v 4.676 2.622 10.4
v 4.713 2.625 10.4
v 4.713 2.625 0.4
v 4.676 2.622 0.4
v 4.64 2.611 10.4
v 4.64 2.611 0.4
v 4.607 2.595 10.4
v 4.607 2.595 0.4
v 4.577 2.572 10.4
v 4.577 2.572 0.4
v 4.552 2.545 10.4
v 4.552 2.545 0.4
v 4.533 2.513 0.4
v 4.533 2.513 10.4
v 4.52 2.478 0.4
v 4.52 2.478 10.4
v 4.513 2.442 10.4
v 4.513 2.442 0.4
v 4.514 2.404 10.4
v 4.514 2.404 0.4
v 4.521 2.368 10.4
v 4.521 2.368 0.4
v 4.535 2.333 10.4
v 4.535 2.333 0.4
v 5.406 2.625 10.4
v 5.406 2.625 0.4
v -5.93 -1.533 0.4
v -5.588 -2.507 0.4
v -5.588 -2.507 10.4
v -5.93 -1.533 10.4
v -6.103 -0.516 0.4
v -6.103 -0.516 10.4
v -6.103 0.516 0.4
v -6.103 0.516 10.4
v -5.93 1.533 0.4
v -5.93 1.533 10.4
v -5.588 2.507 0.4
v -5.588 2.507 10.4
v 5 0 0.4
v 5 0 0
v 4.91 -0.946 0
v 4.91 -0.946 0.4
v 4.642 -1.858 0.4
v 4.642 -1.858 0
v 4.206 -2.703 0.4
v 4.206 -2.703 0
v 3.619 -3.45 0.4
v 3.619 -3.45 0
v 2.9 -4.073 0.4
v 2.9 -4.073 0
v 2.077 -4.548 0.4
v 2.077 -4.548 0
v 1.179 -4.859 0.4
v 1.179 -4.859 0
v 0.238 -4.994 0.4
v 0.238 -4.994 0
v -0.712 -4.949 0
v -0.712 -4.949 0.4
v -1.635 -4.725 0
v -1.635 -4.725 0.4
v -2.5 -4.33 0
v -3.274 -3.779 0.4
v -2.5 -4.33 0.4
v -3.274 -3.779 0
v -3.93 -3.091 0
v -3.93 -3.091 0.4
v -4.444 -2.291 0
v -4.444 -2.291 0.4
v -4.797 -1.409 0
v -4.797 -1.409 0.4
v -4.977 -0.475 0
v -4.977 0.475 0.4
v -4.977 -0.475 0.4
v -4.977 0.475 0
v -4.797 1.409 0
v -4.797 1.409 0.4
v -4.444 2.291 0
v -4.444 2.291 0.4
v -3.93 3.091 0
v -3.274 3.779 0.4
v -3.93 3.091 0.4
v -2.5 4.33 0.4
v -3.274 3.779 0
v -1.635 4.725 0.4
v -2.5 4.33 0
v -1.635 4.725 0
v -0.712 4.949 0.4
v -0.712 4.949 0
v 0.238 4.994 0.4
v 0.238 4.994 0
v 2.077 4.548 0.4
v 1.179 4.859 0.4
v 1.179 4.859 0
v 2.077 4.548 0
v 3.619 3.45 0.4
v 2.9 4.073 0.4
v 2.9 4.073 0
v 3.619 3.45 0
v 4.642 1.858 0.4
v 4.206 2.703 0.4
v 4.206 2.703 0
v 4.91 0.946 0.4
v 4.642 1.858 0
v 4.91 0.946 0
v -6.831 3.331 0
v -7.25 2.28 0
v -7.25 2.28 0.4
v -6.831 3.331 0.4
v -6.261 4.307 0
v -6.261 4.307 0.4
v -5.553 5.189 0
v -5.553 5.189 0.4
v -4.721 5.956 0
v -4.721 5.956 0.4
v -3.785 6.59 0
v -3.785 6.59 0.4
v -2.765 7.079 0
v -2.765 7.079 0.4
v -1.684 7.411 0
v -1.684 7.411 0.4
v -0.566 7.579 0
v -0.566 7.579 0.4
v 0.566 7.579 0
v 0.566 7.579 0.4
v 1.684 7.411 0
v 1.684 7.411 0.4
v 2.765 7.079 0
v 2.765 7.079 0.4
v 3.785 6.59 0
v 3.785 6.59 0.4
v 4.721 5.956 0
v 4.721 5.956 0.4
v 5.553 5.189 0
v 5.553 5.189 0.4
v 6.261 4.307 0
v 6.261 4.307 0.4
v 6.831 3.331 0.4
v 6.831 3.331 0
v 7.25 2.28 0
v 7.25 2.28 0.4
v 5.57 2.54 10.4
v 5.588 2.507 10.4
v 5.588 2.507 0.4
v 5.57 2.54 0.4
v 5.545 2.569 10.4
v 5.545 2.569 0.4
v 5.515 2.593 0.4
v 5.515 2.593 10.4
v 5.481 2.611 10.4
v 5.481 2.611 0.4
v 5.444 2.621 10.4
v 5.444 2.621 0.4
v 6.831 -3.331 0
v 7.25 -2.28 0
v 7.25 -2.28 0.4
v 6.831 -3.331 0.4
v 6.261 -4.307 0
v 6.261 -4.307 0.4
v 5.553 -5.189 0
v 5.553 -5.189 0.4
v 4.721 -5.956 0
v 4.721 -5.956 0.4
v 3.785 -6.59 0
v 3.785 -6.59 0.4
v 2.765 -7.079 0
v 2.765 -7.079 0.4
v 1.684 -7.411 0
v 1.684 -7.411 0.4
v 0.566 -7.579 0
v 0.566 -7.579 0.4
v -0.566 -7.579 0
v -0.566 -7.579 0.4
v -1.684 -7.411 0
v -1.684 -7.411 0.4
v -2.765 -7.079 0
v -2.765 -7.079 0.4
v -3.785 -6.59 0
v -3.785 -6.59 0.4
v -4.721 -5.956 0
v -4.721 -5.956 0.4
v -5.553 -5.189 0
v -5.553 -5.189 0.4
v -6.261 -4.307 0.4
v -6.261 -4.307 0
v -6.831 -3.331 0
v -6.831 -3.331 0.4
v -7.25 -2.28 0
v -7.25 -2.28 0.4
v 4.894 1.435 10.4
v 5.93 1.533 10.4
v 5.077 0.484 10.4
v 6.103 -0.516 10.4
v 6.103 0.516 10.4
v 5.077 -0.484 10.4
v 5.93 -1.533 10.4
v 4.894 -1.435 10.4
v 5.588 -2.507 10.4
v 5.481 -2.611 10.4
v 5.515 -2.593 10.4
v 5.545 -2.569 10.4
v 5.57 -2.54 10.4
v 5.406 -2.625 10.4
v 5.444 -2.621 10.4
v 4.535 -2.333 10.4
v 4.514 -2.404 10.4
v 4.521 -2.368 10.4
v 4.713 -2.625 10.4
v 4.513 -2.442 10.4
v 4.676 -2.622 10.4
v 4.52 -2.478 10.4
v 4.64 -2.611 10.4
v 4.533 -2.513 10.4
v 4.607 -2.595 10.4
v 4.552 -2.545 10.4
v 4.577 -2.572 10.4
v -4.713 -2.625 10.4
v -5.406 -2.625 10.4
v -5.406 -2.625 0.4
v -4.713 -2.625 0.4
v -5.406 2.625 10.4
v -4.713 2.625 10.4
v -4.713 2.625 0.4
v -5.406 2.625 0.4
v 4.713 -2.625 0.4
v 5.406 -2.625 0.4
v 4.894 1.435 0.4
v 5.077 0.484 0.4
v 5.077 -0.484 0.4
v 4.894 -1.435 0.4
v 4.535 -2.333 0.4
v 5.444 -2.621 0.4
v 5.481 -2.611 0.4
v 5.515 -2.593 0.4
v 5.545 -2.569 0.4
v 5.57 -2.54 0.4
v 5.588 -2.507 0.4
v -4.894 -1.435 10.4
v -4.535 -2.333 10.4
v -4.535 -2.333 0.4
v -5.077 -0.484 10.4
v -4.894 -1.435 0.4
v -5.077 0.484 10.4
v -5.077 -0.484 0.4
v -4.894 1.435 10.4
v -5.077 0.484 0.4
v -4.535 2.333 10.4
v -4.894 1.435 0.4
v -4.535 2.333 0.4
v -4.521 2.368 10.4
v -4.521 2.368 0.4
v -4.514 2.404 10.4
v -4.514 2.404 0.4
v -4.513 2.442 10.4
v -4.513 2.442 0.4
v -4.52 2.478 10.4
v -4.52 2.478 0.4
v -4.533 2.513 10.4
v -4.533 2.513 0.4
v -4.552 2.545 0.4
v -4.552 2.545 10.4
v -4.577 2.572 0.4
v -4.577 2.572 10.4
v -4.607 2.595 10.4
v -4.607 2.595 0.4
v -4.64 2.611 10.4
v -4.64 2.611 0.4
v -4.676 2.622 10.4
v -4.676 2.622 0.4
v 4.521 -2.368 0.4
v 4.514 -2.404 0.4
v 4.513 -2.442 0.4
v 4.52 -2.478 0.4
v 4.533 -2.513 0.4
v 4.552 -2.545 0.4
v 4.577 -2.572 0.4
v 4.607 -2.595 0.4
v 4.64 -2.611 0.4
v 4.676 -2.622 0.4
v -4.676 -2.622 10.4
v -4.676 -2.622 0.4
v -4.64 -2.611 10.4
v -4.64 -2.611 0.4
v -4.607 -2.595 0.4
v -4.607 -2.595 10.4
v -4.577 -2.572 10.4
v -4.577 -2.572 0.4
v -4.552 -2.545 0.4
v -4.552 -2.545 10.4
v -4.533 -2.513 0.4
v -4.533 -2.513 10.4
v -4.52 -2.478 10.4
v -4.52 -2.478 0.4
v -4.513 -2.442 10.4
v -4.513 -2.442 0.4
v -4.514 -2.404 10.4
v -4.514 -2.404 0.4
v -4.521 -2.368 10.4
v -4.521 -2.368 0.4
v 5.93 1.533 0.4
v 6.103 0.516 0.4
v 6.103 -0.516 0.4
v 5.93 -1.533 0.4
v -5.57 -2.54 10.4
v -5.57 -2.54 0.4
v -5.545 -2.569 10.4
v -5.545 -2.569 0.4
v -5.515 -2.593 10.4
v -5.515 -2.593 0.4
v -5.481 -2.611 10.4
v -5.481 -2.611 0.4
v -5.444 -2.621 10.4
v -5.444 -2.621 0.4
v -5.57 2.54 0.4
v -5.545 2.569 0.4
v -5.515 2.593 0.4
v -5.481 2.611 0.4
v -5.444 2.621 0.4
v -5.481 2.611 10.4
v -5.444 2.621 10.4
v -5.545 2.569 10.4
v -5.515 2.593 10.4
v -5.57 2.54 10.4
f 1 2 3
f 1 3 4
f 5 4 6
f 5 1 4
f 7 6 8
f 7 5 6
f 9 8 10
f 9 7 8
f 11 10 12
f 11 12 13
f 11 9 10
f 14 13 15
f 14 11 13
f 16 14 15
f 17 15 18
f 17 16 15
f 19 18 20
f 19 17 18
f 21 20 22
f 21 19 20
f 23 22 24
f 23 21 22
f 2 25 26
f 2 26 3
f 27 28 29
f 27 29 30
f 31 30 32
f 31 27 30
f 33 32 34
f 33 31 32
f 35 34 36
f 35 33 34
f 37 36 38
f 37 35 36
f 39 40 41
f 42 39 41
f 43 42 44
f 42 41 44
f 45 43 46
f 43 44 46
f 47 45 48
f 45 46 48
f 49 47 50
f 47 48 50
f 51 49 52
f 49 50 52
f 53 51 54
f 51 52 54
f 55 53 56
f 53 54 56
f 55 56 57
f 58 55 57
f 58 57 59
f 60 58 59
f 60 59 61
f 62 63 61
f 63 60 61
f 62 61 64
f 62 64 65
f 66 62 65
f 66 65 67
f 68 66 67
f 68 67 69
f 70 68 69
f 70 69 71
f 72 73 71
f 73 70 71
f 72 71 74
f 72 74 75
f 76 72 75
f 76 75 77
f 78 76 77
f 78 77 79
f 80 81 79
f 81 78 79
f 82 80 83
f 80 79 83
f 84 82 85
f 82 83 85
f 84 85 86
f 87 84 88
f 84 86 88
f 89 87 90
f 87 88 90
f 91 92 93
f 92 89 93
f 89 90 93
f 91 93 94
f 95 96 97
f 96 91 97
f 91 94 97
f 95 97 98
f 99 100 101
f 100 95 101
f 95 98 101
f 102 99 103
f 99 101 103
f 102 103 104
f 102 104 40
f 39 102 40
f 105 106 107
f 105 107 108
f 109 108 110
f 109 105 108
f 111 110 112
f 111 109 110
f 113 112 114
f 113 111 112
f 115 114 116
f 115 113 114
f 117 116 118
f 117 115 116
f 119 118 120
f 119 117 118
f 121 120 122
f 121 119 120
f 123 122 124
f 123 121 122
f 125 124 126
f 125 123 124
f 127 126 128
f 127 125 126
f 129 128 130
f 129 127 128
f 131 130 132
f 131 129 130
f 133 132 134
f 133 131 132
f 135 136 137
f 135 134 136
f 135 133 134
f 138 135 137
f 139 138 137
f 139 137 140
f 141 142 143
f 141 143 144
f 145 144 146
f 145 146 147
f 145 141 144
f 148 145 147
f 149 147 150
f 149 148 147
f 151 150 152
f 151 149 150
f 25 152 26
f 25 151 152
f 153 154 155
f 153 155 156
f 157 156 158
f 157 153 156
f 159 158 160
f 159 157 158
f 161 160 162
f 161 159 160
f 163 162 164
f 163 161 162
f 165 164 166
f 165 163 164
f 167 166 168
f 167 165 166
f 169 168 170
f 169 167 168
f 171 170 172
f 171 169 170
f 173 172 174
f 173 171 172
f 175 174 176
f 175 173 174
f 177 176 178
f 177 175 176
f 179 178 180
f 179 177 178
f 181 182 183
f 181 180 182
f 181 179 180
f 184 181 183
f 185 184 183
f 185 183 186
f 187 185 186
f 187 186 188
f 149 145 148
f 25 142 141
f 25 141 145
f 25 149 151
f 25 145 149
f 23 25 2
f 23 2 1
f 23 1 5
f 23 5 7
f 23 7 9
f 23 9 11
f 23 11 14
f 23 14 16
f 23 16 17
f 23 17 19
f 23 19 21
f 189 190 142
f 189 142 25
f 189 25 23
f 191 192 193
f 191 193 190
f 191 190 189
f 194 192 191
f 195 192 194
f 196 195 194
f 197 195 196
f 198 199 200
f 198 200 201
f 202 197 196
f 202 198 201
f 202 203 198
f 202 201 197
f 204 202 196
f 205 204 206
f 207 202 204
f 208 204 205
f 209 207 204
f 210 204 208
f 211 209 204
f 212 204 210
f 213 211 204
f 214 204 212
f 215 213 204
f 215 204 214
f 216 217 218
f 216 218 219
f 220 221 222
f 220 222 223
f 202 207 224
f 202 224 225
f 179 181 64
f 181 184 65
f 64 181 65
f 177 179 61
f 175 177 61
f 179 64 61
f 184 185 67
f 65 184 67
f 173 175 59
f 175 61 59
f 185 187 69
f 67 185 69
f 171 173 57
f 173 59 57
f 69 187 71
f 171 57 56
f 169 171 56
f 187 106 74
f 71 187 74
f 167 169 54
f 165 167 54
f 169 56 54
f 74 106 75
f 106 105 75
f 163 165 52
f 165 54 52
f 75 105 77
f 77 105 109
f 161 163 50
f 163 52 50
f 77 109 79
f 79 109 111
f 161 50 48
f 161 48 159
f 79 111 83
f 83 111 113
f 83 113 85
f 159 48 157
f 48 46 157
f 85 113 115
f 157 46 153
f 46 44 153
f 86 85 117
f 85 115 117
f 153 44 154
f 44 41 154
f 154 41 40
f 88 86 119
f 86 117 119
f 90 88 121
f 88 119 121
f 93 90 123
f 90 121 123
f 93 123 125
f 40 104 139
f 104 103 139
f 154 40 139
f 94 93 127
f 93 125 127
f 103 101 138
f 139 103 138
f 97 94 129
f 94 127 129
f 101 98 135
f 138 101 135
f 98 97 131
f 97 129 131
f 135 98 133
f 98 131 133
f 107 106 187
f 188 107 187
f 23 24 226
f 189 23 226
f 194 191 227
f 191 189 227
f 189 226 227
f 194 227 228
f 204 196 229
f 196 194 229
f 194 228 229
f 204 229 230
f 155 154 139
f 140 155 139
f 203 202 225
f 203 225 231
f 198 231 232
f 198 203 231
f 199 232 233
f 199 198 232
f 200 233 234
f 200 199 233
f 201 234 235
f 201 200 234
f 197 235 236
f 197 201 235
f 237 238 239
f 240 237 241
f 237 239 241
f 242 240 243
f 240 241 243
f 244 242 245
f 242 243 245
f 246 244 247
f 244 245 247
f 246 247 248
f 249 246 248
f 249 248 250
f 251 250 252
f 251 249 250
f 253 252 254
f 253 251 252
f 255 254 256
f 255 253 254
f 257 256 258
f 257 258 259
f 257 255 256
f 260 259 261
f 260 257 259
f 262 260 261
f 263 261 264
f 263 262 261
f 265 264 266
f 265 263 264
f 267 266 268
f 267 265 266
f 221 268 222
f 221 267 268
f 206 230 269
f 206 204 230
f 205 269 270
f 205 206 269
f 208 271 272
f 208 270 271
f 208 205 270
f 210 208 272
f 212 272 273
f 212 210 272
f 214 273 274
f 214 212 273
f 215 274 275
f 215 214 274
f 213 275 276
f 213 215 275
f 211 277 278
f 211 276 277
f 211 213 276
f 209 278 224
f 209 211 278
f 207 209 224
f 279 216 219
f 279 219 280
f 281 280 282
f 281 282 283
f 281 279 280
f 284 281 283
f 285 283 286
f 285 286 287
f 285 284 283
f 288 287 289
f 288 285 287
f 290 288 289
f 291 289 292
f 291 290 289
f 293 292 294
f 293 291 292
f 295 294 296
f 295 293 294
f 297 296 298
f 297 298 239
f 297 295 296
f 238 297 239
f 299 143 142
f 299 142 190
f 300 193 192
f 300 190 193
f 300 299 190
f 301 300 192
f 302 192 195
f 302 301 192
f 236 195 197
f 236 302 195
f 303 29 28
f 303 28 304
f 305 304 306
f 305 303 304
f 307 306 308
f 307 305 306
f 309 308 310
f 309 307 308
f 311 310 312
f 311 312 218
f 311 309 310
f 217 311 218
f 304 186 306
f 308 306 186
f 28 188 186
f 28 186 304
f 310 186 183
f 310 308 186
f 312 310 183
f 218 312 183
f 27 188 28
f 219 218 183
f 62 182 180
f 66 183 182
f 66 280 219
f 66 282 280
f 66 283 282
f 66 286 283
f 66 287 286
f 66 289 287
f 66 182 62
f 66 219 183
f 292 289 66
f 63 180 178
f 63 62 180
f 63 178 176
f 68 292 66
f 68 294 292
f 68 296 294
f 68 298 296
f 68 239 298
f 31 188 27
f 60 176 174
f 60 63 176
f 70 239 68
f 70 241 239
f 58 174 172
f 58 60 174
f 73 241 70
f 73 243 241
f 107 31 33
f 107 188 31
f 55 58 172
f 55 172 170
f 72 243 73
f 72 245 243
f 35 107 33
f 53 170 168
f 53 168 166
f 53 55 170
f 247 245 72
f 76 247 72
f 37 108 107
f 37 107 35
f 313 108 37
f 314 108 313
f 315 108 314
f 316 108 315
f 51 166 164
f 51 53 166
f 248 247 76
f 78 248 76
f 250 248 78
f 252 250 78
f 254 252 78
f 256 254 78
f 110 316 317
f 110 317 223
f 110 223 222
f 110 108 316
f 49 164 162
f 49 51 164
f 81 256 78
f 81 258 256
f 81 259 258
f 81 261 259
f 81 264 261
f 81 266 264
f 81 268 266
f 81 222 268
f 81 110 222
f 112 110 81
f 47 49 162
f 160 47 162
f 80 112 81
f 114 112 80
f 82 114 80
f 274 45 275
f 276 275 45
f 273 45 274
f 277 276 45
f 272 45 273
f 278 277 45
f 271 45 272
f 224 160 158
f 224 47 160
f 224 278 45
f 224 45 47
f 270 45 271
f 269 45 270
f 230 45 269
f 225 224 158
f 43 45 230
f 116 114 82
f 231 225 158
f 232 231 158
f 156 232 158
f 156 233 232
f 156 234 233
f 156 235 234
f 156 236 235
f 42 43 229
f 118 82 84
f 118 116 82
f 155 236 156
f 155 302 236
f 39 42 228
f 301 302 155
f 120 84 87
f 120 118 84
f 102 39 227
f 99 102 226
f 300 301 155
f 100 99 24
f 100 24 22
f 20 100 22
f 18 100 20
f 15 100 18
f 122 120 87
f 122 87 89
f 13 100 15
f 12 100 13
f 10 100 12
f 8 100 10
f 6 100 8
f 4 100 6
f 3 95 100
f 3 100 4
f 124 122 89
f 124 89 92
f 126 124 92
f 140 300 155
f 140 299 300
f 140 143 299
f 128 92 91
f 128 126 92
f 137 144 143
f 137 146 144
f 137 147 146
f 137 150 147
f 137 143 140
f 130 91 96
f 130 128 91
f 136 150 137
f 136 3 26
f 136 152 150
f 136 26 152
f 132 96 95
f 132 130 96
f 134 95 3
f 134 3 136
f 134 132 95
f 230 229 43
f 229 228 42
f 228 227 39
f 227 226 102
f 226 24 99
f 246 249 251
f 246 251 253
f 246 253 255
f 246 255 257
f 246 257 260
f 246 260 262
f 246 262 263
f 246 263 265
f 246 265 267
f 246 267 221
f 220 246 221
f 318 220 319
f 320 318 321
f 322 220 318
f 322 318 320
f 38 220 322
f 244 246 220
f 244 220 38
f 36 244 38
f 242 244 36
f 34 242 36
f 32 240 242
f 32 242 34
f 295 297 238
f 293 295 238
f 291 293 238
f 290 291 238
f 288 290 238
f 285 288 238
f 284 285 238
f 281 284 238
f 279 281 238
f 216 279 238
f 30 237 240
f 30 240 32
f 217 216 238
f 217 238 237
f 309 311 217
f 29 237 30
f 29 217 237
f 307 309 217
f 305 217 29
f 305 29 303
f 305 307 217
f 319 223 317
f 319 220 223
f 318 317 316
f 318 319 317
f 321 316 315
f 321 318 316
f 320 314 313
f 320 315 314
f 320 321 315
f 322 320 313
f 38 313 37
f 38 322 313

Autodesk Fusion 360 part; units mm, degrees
sketch "Sketch1" plane through (0, 0, 0) normal (0, 0, 1) x (1, 0, 0)
  circle A0 centre (0, 0) radius 6.3
  circle A1 centre (0, 0) radius 7.6
  line L0 (0, 7.6) -> (0, -7.6) construction
  circle A2 centre (0, 0) radius 3.25
  line L1 (-3.25, 0) -> (-3.25, -3.35)
  line L2 (-3.25, -3.35) -> (3.25, -3.35)
  line L3 (3.25, 0) -> (3.25, -3.35)
  circle A3 centre (0, 0) radius 5
  dimension "d1" = 12.6
  dimension "d2" = 15.2
  dimension "d3" = 6.5
  dimension "d4" = 3.35
  dimension "d15" = 10
extrude "Extrude1" add sketch "Sketch1" along normal blind 0.4 contours A0 | A1
sketch "Sketch2" plane through (0, 0, 0.4) normal (0, 0, 1) x (-1, 0, 0)
  circle A0 centre (0, 0) radius 7.6
  circle A1 centre (0, 0) radius 6.125
  circle A2 centre (0, 0) radius 5.1
  line L0 (-10, -2.625) -> (10, -2.625)
  line L1 (10, -2.625) -> (10, 2.625)
  line L2 (10, 2.625) -> (-10, 2.625)
  line L3 (-10, 2.625) -> (-10, -2.625)
  line L4 (-10, -2.625) -> (10, 2.625) construction
  line L5 (10, -2.625) -> (-10, 2.625) construction
  circle A3 centre (0, 0) radius 5
  dimension "d7" = 12.25
  dimension "d8" = 10.2
  dimension "d9" = 5.25
  dimension "d10" = 20
extrude "Extrude2" add sketch "Sketch2" along normal blind 10 contours A1 A2 L0 L2 | A1 A2 L0 L2
fillet "Fillet1" radius 0.2 8 edges at (4.3726, -2.625, 5.4) (4.3726, 2.625, 5.4) (5.534, 2.625, 5.4) (5.534, -2.625, 5.4) (-4.3726, -2.625, 5.4) (-4.3726, 2.625, 5.4) (-5.534, 2.625, 5.4) (-5.534, -2.625, 5.4)
sketch "Sketch3" plane through (0, 0, 0) normal (0, 0, -1) x (1, 0, 0)
  circle A0 centre (0, 0) radius 5
  circle A1 centre (0, 0) radius 7.6
  line L0 (-7.25, 10) -> (7.25, 10)
  line L1 (7.25, 10) -> (7.25, -10)
  line L2 (7.25, -10) -> (-7.25, -10)
  line L3 (-7.25, -10) -> (-7.25, 10)
  line L4 (-7.25, 10) -> (7.25, -10) construction
  line L5 (7.25, 10) -> (-7.25, -10) construction
  dimension "d16" = 14.5
  dimension "d17" = 20
extrude "Extrude3" cut sketch "Sketch3" against normal blind 12 contours A1 L1 | A1 L3
equation "d4 = 6.6 mm - ( d3 / 2 )"
